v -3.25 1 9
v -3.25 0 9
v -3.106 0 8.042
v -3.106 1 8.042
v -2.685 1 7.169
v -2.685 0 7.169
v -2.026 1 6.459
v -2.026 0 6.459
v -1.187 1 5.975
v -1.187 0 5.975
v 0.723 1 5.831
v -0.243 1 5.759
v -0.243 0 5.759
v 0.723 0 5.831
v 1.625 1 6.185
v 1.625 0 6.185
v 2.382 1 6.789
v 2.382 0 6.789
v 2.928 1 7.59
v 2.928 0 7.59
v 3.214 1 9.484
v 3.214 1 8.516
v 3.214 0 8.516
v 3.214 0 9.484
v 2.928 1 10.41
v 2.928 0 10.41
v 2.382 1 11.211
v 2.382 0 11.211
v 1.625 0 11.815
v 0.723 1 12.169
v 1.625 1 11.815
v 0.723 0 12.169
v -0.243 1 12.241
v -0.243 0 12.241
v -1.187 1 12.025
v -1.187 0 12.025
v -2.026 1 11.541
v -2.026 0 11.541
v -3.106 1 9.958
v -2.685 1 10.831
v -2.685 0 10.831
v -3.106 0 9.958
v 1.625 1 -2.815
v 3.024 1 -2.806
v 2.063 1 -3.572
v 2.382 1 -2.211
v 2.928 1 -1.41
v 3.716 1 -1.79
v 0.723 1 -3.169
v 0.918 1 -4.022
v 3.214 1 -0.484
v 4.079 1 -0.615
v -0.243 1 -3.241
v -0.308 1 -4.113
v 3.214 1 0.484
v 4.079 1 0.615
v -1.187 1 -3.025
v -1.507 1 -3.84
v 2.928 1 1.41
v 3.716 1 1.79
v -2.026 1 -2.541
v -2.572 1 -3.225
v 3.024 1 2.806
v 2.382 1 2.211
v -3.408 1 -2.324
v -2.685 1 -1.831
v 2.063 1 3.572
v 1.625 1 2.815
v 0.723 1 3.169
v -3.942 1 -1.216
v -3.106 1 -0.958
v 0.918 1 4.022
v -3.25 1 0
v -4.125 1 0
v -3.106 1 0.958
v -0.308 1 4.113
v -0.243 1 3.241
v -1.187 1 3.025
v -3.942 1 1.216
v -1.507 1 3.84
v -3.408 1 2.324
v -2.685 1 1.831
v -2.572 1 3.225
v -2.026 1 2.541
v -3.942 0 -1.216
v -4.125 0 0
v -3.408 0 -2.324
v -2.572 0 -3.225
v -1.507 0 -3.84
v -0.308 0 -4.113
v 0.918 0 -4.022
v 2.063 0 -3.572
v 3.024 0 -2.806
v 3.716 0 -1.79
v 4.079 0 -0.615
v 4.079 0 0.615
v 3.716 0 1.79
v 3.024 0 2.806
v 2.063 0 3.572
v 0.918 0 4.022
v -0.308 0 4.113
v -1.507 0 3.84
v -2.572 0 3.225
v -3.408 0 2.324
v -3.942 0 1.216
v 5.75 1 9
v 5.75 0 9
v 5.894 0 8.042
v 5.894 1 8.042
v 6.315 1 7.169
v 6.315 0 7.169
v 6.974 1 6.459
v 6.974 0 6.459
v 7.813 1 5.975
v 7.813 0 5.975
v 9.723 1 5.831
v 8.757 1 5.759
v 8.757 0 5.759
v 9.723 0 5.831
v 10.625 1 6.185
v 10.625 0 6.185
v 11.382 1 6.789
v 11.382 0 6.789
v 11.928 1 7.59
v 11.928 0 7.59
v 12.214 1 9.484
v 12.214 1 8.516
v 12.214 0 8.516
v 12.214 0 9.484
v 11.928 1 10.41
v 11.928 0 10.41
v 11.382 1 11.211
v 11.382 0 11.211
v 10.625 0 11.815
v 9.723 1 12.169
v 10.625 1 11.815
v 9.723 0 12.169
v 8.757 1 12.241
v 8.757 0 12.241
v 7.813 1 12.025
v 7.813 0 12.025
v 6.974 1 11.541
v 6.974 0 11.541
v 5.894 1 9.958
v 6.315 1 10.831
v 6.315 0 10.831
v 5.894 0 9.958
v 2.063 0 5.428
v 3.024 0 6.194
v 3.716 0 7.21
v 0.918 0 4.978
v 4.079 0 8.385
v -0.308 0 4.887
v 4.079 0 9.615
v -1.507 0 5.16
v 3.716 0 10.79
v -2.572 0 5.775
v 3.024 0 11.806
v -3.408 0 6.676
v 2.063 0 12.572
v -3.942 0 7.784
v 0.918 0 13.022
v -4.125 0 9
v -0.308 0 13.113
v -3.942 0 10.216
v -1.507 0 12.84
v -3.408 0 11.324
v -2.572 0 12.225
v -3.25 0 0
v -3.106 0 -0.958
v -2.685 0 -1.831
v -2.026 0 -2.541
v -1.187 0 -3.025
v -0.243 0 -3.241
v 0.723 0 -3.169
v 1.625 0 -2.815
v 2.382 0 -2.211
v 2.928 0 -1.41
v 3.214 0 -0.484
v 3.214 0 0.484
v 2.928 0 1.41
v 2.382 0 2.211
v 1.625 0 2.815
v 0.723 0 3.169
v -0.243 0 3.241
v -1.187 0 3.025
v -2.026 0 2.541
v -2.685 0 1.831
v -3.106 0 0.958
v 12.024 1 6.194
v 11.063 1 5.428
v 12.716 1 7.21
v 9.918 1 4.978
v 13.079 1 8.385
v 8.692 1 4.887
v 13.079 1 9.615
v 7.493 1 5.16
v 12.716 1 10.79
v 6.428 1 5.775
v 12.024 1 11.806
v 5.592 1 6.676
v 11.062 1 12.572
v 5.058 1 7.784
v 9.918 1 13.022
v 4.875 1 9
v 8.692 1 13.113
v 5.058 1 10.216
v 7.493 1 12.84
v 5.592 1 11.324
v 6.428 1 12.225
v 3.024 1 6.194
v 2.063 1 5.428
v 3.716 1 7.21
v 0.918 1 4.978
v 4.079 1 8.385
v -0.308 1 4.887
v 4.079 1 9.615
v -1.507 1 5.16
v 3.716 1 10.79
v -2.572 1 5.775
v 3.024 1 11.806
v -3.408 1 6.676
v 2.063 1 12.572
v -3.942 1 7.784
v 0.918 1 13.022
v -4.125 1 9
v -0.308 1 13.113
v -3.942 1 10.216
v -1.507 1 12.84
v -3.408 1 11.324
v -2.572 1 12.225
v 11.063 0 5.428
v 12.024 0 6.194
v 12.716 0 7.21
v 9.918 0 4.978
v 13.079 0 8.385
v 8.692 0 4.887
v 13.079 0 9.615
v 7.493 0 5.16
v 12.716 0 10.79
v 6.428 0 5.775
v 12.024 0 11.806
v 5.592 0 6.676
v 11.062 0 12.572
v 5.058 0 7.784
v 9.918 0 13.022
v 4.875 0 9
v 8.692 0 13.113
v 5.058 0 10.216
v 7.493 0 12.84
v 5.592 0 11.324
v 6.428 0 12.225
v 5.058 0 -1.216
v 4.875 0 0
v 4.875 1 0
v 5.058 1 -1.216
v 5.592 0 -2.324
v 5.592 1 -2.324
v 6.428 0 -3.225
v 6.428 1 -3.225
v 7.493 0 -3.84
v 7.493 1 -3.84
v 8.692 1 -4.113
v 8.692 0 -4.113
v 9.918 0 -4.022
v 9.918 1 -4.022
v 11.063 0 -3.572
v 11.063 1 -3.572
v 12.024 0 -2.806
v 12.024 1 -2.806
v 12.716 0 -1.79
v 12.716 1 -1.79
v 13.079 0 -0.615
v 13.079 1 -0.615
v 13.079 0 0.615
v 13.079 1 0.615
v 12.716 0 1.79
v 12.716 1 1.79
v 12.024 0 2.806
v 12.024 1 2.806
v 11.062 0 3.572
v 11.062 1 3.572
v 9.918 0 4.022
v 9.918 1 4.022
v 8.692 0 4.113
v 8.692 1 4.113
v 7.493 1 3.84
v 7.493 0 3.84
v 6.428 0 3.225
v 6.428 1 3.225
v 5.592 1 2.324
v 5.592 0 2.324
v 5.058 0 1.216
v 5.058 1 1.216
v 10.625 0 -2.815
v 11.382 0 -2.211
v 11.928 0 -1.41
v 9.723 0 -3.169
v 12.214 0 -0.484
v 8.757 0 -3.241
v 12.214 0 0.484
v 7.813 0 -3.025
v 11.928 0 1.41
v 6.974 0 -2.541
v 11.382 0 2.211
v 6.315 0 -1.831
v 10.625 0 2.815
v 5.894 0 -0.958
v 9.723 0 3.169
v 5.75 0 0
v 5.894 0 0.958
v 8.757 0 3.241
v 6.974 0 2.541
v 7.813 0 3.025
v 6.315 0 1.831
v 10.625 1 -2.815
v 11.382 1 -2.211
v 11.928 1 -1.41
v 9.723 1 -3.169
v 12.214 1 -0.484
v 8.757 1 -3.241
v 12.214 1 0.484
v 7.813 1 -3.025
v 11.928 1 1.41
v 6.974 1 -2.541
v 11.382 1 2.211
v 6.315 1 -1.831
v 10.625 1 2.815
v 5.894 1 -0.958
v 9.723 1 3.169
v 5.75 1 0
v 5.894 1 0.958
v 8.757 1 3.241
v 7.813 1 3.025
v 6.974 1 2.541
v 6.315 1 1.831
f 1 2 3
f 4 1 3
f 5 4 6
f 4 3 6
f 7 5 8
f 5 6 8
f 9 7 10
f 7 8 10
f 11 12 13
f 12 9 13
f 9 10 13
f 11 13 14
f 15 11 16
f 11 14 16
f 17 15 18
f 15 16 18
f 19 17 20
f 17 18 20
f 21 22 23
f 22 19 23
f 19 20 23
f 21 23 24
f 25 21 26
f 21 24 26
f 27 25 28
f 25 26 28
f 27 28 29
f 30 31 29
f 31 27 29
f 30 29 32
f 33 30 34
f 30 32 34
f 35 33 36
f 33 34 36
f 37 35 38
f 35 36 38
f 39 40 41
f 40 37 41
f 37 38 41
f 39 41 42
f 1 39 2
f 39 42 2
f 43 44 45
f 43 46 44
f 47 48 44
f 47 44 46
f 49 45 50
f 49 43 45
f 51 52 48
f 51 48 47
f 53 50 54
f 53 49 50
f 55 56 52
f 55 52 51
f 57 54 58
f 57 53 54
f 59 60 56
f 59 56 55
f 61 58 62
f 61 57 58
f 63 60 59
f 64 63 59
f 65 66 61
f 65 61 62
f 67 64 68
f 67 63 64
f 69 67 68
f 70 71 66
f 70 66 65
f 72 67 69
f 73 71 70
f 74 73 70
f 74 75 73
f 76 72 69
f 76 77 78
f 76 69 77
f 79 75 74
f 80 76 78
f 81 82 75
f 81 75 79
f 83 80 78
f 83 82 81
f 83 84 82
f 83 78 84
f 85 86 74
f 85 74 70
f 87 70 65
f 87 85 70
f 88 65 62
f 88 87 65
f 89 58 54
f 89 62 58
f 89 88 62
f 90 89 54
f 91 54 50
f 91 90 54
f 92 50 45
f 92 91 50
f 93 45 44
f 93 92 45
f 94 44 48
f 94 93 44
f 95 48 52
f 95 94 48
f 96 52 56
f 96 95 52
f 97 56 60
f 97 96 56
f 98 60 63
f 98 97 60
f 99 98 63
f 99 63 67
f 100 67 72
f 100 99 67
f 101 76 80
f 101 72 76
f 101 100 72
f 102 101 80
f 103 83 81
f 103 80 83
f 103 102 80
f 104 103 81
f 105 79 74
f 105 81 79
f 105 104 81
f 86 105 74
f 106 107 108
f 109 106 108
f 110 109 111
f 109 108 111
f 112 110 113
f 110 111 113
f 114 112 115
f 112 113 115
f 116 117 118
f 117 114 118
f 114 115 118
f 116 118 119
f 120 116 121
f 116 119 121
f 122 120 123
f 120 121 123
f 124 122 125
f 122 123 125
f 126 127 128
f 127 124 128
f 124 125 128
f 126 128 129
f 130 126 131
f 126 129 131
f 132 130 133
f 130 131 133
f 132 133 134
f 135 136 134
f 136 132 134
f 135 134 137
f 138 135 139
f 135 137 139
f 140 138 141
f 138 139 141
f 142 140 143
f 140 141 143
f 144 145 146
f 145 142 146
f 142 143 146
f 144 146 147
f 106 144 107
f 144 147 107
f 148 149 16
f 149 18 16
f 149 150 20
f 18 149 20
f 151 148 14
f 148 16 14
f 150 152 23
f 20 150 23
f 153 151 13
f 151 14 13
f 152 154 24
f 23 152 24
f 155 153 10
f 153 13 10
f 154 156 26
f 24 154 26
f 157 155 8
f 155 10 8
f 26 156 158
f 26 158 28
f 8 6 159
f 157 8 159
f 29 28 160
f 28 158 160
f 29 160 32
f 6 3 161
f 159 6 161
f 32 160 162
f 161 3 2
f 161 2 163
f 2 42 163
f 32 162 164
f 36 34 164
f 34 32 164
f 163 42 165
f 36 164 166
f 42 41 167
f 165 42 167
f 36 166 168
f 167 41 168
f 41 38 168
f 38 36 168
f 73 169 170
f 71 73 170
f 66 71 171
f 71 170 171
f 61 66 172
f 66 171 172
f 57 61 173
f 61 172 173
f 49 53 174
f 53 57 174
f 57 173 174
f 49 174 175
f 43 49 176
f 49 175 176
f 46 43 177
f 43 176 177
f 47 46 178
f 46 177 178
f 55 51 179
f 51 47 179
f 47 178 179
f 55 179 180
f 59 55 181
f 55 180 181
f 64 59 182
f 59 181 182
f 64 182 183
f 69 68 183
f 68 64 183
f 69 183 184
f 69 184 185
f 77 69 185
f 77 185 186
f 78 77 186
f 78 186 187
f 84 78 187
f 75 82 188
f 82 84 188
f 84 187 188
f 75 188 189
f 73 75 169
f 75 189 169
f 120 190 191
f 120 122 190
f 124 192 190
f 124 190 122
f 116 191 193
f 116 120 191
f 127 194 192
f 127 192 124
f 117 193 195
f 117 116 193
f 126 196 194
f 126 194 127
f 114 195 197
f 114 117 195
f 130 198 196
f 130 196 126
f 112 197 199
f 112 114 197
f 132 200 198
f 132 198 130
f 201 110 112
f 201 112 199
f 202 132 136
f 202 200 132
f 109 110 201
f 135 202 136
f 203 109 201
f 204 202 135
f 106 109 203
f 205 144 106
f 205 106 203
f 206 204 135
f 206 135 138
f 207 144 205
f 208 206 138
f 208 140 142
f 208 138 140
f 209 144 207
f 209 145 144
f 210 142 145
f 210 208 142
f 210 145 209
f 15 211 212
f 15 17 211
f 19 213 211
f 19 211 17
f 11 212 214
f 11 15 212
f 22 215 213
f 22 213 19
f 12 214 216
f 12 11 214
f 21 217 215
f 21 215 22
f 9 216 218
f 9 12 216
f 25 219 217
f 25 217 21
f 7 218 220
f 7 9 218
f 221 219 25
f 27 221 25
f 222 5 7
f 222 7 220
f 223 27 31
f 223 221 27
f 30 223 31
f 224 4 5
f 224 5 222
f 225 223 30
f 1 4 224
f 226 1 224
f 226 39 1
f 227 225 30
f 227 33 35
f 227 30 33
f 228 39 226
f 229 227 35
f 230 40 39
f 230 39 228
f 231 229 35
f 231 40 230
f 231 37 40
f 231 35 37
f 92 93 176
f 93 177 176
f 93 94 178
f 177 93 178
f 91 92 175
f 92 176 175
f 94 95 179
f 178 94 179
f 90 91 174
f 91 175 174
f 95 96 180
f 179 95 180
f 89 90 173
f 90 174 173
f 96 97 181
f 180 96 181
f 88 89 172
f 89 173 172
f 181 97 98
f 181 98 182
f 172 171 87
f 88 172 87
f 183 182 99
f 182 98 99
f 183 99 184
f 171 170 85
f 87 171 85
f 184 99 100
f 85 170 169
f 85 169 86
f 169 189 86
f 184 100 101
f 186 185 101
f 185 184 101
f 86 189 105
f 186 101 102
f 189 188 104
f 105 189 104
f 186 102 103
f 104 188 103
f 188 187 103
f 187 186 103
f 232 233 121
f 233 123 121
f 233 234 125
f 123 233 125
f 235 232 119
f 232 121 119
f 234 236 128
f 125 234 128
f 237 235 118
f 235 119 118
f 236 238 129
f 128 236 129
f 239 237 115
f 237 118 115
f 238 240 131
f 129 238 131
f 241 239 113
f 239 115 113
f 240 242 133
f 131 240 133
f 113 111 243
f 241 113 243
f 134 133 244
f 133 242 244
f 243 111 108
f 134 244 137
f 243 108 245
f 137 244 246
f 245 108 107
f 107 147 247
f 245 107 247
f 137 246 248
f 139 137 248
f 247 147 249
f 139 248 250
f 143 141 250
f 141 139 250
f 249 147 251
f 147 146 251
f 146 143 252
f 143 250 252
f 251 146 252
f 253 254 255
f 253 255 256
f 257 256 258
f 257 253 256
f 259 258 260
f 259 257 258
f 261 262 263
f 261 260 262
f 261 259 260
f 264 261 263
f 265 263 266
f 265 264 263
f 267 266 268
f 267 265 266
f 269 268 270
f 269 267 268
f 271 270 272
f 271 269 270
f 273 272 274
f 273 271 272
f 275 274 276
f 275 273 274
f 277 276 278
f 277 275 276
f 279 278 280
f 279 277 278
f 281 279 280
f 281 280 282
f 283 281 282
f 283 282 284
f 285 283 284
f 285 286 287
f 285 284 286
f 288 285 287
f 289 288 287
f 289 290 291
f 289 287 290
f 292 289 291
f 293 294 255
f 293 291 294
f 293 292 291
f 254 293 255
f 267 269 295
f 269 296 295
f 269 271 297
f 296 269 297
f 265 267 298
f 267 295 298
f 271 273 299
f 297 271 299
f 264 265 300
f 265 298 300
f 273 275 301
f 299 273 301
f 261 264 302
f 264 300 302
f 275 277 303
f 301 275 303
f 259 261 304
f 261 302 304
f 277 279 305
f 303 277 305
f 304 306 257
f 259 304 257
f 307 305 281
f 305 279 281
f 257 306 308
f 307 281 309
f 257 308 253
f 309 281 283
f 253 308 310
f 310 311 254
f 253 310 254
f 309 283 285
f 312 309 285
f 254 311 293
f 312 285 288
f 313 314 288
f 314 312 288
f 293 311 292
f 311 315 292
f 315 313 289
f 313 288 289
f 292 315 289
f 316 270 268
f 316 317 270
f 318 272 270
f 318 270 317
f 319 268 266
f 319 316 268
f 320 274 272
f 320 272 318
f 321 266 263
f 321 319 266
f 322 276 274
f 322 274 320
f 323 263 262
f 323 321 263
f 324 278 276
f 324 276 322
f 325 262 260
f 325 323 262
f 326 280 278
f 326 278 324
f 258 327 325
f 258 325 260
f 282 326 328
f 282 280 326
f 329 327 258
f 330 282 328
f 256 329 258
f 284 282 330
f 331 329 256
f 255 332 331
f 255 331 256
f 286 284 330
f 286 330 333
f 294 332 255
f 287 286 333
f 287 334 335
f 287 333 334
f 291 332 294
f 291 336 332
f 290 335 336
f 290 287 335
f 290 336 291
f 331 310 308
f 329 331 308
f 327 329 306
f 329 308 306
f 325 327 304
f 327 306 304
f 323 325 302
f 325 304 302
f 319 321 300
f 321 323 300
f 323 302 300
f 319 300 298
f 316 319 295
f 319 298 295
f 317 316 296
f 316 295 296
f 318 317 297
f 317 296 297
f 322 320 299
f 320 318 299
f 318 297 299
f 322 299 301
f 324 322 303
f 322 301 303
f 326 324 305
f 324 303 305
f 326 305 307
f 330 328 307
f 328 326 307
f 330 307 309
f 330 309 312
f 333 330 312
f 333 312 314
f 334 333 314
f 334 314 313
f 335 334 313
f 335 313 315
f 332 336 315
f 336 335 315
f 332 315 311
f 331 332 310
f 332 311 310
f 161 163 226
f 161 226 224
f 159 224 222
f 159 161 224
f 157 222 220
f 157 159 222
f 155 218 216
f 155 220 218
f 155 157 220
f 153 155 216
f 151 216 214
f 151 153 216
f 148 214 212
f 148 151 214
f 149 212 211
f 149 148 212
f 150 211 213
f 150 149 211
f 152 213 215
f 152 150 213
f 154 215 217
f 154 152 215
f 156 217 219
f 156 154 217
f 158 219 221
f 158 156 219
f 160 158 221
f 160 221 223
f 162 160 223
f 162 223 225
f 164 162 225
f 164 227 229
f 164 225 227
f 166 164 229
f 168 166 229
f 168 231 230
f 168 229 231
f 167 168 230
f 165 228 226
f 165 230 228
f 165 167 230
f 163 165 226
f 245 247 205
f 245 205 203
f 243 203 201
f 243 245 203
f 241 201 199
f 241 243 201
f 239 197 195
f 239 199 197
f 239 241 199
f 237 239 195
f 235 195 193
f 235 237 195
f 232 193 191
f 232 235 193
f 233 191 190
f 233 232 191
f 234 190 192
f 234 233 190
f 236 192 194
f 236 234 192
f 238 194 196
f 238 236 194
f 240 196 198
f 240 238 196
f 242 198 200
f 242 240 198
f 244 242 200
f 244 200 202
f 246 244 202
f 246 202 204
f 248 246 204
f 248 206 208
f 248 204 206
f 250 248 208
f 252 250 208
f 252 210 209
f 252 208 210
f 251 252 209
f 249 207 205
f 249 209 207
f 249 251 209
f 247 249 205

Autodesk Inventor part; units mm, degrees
ref_plane "YZ Plane" through (0, 0, 0) normal (1, 0, 0) x (0, 1, 0)
ref_plane "XZ Plane" through (0, 0, 0) normal (0, 1, 0) x (-1, 0, 0)
ref_plane "XY Plane" through (0, 0, 0) normal (0, 0, 1) x (1, 0, 0)
sketch "Sketch1" plane through (0, 0, 0) normal (0, 1, 0) x (-1, 0, 0)
  circle A0 centre (0, 0) radius 4.125
  circle A1 centre (0, 0) radius 3.25
  dimension "d0" = 8.25
  dimension "d1" = 6.5
extrude "Extrusion1" add sketch "Sketch1" along normal blind 1
pattern_linear "Rectangular Pattern1" count 2 spacing 9 along (1, 0, 0) count 2 spacing 9 along (0, 0, 1) of "Extrusion1"
properties part number "spool_holder_inner_washer"
